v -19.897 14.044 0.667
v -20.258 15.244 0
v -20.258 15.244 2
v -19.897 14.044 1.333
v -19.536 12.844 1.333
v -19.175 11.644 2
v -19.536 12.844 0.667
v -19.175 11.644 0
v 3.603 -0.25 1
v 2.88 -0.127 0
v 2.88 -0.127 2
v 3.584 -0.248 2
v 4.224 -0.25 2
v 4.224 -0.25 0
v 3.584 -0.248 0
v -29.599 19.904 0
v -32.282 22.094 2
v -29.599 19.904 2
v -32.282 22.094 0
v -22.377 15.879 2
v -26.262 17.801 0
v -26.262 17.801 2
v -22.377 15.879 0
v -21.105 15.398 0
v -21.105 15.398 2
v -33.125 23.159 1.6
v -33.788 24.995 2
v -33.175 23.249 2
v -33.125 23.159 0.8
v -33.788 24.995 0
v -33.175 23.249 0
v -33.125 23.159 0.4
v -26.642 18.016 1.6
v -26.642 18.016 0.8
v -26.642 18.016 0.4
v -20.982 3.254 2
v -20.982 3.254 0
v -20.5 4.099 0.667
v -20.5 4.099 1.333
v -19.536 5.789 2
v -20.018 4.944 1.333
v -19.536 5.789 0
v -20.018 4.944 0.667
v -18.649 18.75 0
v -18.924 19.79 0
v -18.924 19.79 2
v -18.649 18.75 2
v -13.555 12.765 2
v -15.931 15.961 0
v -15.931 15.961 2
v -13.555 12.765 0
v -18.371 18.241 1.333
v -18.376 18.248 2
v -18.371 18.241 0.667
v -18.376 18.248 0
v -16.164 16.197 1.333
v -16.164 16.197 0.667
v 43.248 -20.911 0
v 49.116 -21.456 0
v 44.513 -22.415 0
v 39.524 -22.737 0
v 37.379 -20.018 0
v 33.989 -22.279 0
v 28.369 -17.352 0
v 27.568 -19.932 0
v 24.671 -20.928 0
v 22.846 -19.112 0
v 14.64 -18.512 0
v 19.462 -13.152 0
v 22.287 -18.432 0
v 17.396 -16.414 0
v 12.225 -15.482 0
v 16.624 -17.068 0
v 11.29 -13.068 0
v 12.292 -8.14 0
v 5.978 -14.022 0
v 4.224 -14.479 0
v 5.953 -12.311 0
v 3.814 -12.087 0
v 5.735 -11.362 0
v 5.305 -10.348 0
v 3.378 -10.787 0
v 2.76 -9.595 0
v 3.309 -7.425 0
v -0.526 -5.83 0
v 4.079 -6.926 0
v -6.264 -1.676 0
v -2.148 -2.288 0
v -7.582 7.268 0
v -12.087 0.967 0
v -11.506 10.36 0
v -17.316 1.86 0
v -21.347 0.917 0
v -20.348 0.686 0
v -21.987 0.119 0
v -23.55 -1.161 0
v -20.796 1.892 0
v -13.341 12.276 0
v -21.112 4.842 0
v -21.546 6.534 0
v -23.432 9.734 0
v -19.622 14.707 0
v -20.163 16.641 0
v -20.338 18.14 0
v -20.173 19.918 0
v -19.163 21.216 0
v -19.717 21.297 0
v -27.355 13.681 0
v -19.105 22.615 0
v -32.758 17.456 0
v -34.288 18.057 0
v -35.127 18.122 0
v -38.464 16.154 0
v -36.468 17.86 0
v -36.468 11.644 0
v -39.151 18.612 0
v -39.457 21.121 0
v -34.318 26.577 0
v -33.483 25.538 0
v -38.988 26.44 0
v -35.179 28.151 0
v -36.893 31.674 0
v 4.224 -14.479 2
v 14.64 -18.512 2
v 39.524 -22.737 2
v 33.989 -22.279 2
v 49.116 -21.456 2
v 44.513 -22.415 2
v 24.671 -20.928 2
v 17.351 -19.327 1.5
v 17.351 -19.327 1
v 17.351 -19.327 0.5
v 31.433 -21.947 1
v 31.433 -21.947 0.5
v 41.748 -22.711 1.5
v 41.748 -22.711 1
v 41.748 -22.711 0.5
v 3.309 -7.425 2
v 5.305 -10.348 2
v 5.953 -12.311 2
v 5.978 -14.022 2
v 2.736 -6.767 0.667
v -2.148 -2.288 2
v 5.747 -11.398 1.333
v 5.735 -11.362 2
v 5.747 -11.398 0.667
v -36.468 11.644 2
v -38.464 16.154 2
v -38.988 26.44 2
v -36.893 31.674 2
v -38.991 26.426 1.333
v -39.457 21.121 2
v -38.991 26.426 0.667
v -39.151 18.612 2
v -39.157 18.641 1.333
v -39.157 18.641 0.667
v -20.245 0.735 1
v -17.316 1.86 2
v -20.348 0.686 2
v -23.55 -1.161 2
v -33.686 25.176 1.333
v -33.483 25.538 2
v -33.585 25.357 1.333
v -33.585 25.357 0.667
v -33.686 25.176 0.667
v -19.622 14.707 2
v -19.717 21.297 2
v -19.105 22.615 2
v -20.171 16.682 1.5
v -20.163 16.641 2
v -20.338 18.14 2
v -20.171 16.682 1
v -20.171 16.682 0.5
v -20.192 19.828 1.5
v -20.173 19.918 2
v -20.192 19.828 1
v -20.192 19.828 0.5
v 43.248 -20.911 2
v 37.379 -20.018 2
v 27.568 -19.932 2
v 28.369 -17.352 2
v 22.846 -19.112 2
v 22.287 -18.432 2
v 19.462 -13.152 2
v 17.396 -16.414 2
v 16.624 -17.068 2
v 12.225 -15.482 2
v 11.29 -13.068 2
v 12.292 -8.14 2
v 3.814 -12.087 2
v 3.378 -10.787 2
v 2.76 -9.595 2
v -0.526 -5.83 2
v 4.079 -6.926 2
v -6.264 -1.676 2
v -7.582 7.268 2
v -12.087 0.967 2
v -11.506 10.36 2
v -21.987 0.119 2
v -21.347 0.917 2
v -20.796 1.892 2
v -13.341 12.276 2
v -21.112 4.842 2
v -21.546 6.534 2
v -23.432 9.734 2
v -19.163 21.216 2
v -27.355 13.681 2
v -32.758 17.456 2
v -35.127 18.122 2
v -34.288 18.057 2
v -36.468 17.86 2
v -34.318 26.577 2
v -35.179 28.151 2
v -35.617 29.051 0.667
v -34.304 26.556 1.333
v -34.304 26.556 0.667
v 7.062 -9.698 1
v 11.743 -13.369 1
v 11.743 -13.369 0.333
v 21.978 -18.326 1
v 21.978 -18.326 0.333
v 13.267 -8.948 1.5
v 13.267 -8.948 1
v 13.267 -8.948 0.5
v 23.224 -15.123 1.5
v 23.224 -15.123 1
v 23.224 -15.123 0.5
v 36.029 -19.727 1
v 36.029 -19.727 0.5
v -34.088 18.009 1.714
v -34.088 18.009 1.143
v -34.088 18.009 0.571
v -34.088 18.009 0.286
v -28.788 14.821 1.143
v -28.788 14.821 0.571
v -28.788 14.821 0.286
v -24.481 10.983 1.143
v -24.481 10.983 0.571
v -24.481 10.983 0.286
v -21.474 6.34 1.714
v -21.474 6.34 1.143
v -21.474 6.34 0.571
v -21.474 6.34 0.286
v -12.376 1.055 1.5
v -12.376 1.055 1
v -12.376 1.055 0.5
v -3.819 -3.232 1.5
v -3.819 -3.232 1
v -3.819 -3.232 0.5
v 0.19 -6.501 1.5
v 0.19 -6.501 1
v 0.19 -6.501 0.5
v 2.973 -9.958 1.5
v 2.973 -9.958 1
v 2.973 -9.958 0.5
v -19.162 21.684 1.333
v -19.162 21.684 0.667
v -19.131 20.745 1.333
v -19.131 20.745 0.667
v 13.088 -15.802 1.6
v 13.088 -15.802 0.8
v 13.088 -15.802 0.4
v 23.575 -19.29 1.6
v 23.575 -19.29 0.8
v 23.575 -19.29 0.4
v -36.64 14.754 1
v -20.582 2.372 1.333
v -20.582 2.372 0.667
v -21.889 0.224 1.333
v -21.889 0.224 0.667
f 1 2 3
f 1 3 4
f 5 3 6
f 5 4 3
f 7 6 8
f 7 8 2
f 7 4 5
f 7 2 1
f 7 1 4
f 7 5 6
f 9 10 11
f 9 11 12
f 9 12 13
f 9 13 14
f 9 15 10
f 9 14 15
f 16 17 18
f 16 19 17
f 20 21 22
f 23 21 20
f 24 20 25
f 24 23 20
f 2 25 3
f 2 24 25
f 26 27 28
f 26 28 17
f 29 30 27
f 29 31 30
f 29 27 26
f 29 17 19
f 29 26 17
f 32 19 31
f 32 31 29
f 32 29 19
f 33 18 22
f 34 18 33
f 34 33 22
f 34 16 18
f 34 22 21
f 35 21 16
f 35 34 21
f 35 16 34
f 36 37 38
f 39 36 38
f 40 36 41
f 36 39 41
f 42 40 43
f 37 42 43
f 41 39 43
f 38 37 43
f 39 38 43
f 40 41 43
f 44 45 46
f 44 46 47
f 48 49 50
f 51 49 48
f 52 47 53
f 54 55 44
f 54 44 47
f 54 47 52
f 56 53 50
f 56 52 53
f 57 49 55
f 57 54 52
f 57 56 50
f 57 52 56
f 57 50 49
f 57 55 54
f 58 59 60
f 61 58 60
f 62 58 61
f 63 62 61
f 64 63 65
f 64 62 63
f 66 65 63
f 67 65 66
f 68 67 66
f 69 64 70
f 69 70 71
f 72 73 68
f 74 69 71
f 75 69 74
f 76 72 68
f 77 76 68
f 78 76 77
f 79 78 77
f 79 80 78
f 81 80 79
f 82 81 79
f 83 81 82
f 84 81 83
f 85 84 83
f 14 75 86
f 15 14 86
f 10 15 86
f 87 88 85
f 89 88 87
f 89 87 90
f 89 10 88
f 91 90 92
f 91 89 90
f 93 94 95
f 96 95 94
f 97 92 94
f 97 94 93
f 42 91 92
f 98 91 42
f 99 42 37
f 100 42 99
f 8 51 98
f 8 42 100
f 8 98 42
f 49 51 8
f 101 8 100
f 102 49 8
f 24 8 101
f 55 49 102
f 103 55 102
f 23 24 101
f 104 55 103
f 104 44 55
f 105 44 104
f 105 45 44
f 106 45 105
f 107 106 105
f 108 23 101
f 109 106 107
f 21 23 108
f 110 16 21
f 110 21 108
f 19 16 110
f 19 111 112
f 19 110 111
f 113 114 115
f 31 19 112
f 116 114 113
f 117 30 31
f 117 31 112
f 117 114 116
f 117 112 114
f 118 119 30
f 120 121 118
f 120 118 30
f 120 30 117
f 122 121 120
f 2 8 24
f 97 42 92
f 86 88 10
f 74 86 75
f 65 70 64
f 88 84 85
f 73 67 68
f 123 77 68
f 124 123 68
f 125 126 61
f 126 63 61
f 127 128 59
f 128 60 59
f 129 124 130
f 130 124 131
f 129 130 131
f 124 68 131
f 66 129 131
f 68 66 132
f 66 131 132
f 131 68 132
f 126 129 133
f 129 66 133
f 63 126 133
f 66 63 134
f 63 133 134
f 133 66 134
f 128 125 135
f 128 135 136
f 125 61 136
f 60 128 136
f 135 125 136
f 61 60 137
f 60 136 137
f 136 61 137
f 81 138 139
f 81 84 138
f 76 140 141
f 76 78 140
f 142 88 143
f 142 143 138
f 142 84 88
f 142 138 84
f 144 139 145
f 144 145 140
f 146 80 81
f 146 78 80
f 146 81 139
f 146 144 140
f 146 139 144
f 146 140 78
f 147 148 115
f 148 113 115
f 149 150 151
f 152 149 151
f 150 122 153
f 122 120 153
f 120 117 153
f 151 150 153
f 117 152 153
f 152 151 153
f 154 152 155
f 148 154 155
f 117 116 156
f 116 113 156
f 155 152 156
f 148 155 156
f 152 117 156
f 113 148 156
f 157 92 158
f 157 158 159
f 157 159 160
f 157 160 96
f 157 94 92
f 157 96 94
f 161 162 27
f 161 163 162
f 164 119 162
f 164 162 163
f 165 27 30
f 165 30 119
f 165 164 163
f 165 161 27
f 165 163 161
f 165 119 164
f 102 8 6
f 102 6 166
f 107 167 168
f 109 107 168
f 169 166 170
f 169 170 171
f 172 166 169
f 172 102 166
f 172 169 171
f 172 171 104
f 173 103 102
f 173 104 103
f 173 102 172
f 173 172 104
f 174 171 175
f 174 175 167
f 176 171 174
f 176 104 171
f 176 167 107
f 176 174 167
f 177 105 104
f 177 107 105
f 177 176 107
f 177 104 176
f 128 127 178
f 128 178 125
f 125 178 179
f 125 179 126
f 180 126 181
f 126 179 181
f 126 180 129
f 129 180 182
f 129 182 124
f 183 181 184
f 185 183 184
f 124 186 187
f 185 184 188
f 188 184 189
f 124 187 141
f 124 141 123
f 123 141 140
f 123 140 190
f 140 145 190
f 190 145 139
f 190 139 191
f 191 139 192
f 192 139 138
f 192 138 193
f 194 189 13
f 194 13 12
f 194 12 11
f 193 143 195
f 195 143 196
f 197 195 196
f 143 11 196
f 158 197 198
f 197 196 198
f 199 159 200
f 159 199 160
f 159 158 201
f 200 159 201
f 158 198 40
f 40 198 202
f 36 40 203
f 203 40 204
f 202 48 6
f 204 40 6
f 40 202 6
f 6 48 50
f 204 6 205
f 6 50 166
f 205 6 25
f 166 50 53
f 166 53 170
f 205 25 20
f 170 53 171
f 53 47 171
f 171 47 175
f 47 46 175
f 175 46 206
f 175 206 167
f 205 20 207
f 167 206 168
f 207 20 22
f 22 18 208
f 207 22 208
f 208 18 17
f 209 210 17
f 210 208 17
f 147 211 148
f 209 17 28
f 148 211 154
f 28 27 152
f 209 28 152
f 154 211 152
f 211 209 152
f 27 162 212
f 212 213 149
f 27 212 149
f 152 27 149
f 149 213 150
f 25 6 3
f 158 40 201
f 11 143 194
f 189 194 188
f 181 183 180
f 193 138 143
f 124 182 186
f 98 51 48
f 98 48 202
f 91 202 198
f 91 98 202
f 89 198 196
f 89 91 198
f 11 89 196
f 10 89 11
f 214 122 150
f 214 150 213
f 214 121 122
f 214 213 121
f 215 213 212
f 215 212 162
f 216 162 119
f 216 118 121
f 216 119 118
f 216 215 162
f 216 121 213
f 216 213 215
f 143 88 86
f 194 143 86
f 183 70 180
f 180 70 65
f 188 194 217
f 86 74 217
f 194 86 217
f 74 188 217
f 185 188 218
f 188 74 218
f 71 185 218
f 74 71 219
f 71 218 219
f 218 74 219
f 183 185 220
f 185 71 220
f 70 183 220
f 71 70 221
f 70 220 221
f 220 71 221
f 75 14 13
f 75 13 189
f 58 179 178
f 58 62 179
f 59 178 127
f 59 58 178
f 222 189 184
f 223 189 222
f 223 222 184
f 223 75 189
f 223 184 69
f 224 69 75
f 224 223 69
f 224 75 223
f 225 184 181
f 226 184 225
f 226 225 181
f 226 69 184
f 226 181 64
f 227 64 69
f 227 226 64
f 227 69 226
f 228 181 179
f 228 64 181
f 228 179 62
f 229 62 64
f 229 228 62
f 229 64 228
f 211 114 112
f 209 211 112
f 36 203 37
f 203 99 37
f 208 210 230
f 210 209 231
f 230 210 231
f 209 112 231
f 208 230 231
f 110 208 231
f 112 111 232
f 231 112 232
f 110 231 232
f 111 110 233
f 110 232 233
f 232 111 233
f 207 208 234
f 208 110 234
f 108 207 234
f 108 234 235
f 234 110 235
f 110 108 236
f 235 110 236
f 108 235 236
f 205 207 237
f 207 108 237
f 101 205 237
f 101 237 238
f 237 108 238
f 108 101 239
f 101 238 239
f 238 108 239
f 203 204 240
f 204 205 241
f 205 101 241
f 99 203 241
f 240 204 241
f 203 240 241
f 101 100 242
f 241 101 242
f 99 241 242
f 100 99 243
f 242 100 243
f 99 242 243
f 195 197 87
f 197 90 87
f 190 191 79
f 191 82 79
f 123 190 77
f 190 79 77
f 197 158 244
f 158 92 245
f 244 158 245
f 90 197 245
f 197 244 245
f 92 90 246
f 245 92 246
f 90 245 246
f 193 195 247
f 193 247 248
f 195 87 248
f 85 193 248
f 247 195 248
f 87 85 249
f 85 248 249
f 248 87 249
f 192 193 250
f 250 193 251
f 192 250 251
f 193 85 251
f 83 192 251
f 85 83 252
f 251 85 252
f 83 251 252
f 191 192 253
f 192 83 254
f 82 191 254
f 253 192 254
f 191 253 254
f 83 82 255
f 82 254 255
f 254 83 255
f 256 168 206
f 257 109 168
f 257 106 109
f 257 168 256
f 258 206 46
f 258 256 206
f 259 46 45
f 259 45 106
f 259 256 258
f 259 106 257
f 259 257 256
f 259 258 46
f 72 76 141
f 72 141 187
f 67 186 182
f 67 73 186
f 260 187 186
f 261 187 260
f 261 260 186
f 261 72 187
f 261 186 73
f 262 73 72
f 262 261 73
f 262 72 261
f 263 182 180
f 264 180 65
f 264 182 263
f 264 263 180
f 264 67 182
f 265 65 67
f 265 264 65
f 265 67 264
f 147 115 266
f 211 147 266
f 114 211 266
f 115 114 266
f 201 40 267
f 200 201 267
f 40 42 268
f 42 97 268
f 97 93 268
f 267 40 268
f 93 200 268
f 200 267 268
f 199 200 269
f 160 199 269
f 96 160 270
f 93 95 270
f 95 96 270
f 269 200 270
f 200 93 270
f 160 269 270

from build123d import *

# Parameters (mm, degrees)
F1_DEPTH = 2


with BuildPart() as f1:
    # F0 (on Top) → F1 (new body)
    with BuildSketch(Plane.XY):
        with BuildLine():
            add(Edge.make_bspline(
                [(-36.892823875, 31.6735059023), (-36.4760806127, 30.8190486114), (-35.6495646799, 29.1244259772), (-34.4112406826, 26.5460839174), (-33.7509094867, 25.8287067164), (-33.4834083915, 25.5380962044)],
                knots=[0, 0, 0, 0, 0.3769541602, 0.747603255, 1, 1, 1, 1], degree=3))
            add(Edge.make_bspline(
                [(-36.892823875, 31.6735059023), (-37.7018029806, 30.0496942096), (-39.4603508818, 26.5198741879), (-39.7735037577, 18.3988282966), (-37.56293815, 13.8810475091), (-36.4681892097, 11.6436854005)],
                knots=[0, 0, 0, 0, 0.3007147223, 0.6536896195, 1, 1, 1, 1], degree=3))
            add(Edge.make_bspline(
                [(-36.4681892097, 11.6436854005), (-36.554270953, 12.6805721324), (-36.7263742072, 14.7536200744), (-36.5542307934, 16.8244792552), (-36.4681892097, 17.8595464677)],
                knots=[0, 0, 0, 0, 0.5001749892, 1, 1, 1, 1], degree=3))
            add(Edge.make_bspline(
                [(-36.4681892097, 17.8595464677), (-36.1708702835, 17.942598625), (-35.5072143903, 18.1279822275), (-33.9738334279, 18.1879789291), (-31.2473096137, 16.6283992854), (-28.7220369021, 14.8249586571), (-24.270504214, 11.2062513215), (-21.1496860764, 6.5500019062), (-21.0323364073, 4.2435073738), (-20.9819823503, 3.2538040541)],
                knots=[0, 0, 0, 0, 0.0799667213, 0.1784964937, 0.3200286886, 0.4665624345, 0.6630139011, 0.855401235, 1, 1, 1, 1], degree=3))
            add(Edge.make_bspline(
                [(-20.9819823503, 3.2538040541), (-20.5000173301, 4.0987795219), (-20.0180523098, 4.9437549897), (-19.5360872895, 5.7887304574)],
                knots=[0, 0, 0, 0, 2.9182982023, 2.9182982023, 2.9182982023, 2.9182982023], degree=3))
            add(Edge.make_bspline(
                [(-19.5360872895, 5.7887304574), (-19.8500836866, 4.586843161), (-20.4274520359, 2.3768442855), (-21.7515211634, 0.14059123), (-22.9656937007, -0.7382427101), (-23.5499478877, -1.1611335212)],
                knots=[0, 0, 0, 0, 0.3821544491, 0.7026955898, 1, 1, 1, 1], degree=3))
            add(Edge.make_bspline(
                [(-17.3162166029, 1.8595310394), (-18.2871066723, 1.5320481384), (-20.3278701105, 0.843695098), (-22.4417454777, -0.4715921566), (-23.5499478877, -1.1611335212)],
                knots=[0, 0, 0, 0, 0.4757484631, 1, 1, 1, 1], degree=3))
            add(Edge.make_bspline(
                [(-17.3162166029, 1.8595310394), (-15.7682654481, 1.7280546914), (-12.07998653, 1.4147880609), (-3.5902190594, -2.7617762182), (3.5822844795, -9.4363200449), (4.0366641771, -13.0078754651), (4.2238375172, -14.4791118801)],
                knots=[0, 0, 0, 0, 0.2113014094, 0.5034645513, 0.7954613753, 1, 1, 1, 1], degree=3))
            add(Edge.make_bspline(
                [(4.2238375172, -14.4791118801), (8.4928711, -16.271153987), (17.080837153, -19.8761846062), (31.1894987095, -21.9706650529), (41.5804381145, -23.2279662738), (46.7438639151, -22.0135830549), (49.1163358092, -21.4556027204)],
                knots=[0, 0, 0, 0, 0.277603635, 0.5584520589, 0.7971191762, 1, 1, 1, 1], degree=3))
            add(Edge.make_bspline(
                [(4.2238375172, -0.2498186077), (7.1678333192, -3.3280872191), (12.9566913774, -9.3809695107), (23.060574172, -15.4634069035), (35.9625991683, -20.3647968854), (44.7540193116, -21.093846938), (49.1163358092, -21.4556027204)],
                knots=[0, 0, 0, 0, 0.2479261528, 0.4875038567, 0.7456986079, 1, 1, 1, 1], degree=3))
            add(Edge.make_bspline(
                [(2.8798265848, -0.1270156063), (3.1250806645, -0.1786100019), (3.5959650034, -0.2776705066), (4.0204433049, -0.2588410046), (4.2238375172, -0.2498186077)],
                knots=[0, 0, 0, 0, 0.5208371982, 1, 1, 1, 1], degree=3))
            add(Edge.make_bspline(
                [(-13.5553438542, 12.7646509897), (-13.5118544386, 12.6083215107), (-12.7576294229, 10.7088283093), (-4.5788480056, 5.0414103601), (2.8798265848, -0.1270156063)],
                knots=[0.6164442698, 0.6164442698, 0.6164442698, 0.6164442698, 0.6502147162, 1, 1, 1, 1], degree=3))
            add(Edge.make_bspline(
                [(-18.9239028841, 19.7896957397), (-18.8216414365, 19.2603015368), (-18.5814122526, 18.0148186233), (-15.8728443578, 16.2848236323), (-14.37488704, 14.0052965922), (-13.5553438542, 12.7646509897)],
                knots=[0, 0, 0, 0, 0.25175726, 0.5923143721, 1, 1, 1, 1], degree=3))
            add(Edge.make_bspline(
                [(-19.1046763211, 22.6151496172), (-19.1766473117, 21.6857871331), (-19.2486183023, 20.7564246489), (-18.9239028841, 19.7896957397)],
                knots=[0, 0, 0, 0, 0.1303574771, 0.1303574771, 0.1303574771, 0.1303574771], degree=3))
            add(Edge.make_bspline(
                [(-19.1749576479, 11.6436854005), (-19.2095643861, 12.3967065777), (-19.2827182831, 13.9884900451), (-20.3541623487, 16.6548297738), (-20.4335841428, 19.8942270324), (-19.5439070905, 21.7158299648), (-19.1046763211, 22.6151496172)],
                knots=[0, 0, 0, 0, 0.2260384323, 0.4778142374, 0.7421985274, 1, 1, 1, 1], degree=3))
            add(Edge.make_bspline(
                [(-20.2583502978, 15.2437789366), (-19.8972194145, 14.0437477579), (-19.5360885312, 12.8437165792), (-19.1749576479, 11.6436854005)],
                knots=[0, 0, 0, 0, 3.7595761865, 3.7595761865, 3.7595761865, 3.7595761865], degree=3))
            add(Edge.make_bspline(
                [(-33.7876603007, 24.9949414283), (-33.6236251779, 24.3653589146), (-33.2678738045, 22.9999510678), (-31.2021192365, 21.0072148981), (-26.94393059, 17.9530097539), (-21.3534839337, 15.3316633489), (-20.4992969927, 15.2631148952), (-20.2583502978, 15.2437789366)],
                knots=[0, 0, 0, 0, 0.1581489893, 0.342985814, 0.6121221714, 0.8905884926, 1, 1, 1, 1], degree=3))
            add(Edge.make_bspline(
                [(-33.4834083915, 25.5380962044), (-33.5848256946, 25.3570446124), (-33.6862429976, 25.1759930203), (-33.7876603007, 24.9949414283)],
                knots=[0, 0, 0, 0, 0.622564322, 0.622564322, 0.622564322, 0.622564322], degree=3))
        make_face()
        with BuildLine():
            add(Edge.make_bspline(
                [(-2.1478733979, -2.288002288), (-0.4522814448, -3.6999078404), (2.7913596471, -6.4008612505), (6.1182947522, -11.1734082674), (6.0187813393, -13.1958650317), (5.9781298041, -14.0220448375)],
                knots=[0, 0, 0, 0, 0.3931566872, 0.7521026411, 1, 1, 1, 1], degree=3))
            add(Edge.make_bspline(
                [(-2.1478733979, -2.288002288), (-0.5462224835, -3.3341756546), (2.6993845378, -5.454155479), (6.9996734971, -9.7852308012), (11.602665591, -13.528953047), (16.958015429, -16.2629965495), (21.9219759964, -18.468036587), (25.6644100983, -19.4385856638), (27.5677610189, -19.9321936816)],
                knots=[0, 0, 0, 0, 0.1657579821, 0.3358942112, 0.504252867, 0.672701612, 0.8335405057, 1, 1, 1, 1], degree=3))
            add(Edge.make_bspline(
                [(5.9781298041, -14.0220448375), (8.7326251969, -14.6373284967), (12.4255044394, -15.4622230526), (13.0138800096, -15.8266776047), (19.3691208857, -18.0172715029), (23.385602125, -19.3864852085), (26.2128834491, -19.7554026536), (27.5677610189, -19.9321936816)],
                knots=[0, 0, 0, 0, 0.2528522054, 0.3389922754, 0.5861108766, 0.8016578383, 1, 1, 1, 1], degree=3))
        make_face(mode=Mode.SUBTRACT)
    extrude(amount=F1_DEPTH)


solid = f1.part
